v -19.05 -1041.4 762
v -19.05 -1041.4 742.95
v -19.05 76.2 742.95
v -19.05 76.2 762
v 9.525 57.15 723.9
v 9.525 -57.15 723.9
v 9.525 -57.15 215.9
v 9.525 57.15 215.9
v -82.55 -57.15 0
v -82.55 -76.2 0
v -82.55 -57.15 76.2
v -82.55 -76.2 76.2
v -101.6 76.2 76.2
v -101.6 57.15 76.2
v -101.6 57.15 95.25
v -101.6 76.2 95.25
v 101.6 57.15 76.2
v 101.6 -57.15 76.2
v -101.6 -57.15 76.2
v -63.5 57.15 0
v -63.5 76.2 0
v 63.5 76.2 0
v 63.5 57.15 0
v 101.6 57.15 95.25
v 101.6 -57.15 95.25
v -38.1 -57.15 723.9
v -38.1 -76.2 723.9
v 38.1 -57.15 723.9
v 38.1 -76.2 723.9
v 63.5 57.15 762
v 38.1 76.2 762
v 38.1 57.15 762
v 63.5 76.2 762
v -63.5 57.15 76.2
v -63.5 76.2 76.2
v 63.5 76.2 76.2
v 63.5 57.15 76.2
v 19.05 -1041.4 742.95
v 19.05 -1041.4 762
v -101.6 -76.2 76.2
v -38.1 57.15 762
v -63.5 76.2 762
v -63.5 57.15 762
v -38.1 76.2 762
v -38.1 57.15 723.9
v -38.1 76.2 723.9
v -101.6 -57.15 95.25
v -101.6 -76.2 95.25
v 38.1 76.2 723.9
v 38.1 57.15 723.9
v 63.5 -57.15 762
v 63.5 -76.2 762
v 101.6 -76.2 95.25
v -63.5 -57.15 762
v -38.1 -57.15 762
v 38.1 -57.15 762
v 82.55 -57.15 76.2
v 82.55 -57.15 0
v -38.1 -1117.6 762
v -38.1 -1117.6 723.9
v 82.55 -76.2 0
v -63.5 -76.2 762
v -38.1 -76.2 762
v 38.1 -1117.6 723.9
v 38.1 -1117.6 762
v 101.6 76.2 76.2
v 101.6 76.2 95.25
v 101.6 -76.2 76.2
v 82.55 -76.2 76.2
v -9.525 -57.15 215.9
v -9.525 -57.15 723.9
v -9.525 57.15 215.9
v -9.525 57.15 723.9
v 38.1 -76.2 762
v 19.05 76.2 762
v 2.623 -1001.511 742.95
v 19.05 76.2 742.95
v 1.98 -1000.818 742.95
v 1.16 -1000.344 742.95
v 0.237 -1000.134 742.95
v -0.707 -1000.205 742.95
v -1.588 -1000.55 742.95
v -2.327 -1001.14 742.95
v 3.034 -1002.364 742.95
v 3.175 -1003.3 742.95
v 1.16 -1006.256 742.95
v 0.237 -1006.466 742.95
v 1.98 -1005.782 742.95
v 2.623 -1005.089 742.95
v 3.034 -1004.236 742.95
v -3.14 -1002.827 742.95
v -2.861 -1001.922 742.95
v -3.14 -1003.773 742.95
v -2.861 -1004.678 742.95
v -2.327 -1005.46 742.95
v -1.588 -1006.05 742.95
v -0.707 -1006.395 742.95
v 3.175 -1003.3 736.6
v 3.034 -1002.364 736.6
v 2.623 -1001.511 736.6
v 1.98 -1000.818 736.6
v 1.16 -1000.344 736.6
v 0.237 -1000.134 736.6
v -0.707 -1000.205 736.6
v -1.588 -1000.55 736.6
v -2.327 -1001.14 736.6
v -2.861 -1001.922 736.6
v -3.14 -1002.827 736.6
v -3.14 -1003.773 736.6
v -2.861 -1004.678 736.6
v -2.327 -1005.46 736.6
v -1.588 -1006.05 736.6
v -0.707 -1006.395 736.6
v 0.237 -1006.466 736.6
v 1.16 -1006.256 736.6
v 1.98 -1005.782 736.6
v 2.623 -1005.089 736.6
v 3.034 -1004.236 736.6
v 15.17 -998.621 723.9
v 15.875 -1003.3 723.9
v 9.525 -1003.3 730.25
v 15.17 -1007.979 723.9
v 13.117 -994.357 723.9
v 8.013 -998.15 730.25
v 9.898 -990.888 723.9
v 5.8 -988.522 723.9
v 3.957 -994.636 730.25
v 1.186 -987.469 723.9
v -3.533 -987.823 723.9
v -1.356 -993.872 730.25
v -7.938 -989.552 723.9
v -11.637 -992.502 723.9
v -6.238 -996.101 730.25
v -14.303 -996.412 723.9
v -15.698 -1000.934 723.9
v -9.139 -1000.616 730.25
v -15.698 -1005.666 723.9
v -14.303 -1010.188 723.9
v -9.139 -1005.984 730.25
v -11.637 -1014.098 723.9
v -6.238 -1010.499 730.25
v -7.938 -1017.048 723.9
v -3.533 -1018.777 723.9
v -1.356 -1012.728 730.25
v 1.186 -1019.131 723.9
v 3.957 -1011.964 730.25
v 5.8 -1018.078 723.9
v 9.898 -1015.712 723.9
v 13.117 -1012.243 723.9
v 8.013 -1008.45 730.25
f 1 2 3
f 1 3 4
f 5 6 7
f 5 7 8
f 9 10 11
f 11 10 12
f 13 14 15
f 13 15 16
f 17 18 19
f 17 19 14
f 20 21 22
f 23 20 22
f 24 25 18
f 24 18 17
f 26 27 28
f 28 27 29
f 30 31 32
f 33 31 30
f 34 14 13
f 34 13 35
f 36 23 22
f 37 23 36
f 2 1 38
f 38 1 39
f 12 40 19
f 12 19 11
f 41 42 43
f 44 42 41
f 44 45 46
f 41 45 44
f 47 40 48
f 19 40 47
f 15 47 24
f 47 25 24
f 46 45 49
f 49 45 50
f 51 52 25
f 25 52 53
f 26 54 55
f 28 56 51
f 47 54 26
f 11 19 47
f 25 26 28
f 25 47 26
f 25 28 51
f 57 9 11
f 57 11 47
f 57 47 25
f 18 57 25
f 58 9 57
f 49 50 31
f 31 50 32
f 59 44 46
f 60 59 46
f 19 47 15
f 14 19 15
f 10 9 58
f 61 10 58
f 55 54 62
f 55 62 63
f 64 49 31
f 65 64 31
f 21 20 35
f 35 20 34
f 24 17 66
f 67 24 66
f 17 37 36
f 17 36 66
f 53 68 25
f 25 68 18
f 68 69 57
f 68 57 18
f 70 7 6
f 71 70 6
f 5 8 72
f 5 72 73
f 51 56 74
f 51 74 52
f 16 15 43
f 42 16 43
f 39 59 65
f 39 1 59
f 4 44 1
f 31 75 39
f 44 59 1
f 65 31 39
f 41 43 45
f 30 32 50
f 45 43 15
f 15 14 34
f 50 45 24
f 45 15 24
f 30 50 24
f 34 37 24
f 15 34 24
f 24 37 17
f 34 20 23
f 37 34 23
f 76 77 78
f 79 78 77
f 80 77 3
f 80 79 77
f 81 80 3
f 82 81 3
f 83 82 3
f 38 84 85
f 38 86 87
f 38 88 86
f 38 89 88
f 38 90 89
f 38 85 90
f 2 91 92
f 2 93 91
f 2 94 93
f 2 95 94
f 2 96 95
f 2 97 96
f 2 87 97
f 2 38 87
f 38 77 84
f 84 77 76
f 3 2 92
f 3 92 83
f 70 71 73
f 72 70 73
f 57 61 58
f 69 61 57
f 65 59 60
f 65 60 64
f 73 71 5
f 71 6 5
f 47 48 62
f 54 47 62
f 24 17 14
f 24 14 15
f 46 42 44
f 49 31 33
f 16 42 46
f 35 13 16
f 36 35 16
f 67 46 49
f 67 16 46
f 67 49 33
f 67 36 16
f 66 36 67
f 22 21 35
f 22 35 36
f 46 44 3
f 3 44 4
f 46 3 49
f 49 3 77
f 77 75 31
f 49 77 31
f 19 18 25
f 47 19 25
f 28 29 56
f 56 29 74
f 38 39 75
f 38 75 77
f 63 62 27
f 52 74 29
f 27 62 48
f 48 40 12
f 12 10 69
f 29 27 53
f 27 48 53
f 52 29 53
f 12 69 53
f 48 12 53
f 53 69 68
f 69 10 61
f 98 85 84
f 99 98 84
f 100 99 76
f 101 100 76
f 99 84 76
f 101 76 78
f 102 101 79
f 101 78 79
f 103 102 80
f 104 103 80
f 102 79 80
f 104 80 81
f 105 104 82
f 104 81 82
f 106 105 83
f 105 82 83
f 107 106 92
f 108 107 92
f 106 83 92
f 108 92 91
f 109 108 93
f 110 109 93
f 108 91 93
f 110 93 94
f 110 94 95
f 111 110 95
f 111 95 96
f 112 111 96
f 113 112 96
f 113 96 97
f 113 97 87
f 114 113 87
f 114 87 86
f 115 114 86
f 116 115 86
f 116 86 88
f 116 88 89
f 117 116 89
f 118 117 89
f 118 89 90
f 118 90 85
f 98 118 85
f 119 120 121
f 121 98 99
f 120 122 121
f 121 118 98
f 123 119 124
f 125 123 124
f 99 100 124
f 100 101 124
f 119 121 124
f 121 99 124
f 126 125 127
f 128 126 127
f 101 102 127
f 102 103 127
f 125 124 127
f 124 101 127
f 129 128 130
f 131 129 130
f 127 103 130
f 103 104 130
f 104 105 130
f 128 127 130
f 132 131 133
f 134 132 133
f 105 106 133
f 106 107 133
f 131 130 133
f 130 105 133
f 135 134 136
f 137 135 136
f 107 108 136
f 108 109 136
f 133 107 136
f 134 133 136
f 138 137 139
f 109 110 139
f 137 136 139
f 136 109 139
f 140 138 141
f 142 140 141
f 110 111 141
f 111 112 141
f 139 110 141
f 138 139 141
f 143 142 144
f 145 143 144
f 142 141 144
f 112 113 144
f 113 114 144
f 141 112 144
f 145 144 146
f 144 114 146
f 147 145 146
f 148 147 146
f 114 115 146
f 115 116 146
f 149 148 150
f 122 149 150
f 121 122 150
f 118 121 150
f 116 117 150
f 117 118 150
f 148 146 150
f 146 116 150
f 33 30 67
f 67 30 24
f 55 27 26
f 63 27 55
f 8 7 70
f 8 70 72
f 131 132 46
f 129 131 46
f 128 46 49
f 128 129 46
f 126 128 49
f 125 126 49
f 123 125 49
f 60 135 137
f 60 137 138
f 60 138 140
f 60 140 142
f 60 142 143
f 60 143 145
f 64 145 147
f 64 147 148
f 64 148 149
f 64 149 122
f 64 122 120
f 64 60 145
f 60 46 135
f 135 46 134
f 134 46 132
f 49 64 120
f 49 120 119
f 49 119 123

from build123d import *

# Parameters (mm, degrees)
F0_W           = 203.2
F0_H           = 19.05
F1_DEPTH       = 762
F2_W           = 19.05
F2_H           = 76.2
F2_W_2         = 76.2
F2_H_2         = 38.1
F3_DEPTH       = 25.4
F4_W           = 76.2
F4_H           = 38.1
F4_W_2         = 38.1
F4_H_2         = 76.2
F5_DEPTH       = 25.4
F7_DEPTH       = 1117.6
F7_DEPTH_BACK  = 76.2
F8_R           = 3.175
F9_DEPTH       = 25.4
F10_SIZE       = 12.7
F12_START      = 1041.4
F11_W          = 38.1
F11_H          = 19.05
F12_DEPTH      = 76.2
F13_W          = 114.3
F13_H          = 508
F14_DEPTH      = 9.525
F14_DEPTH_BACK = 9.525
F15_W          = 114.3
F15_H          = 19.05
F16_DEPTH      = 101.6
F16_DEPTH_BACK = 101.6


with BuildPart() as f1:
    # F0 (on Top) → F1 (new body)
    with BuildSketch(Plane.XY):
        with Locations((0, -66.675)):
            Rectangle(F0_W, F0_H)
    extrude(amount=F1_DEPTH)

    # F2 (on face) → F3 (cut)
    with BuildSketch(Plane.XZ.offset(76.2)):
        Polygon((101.6, 95.25), (101.6, 762), (63.5, 762), align=None)
        Polygon((-101.6, 95.25), (-63.5, 762), (-101.6, 762), align=None)
        with Locations((-92.075, 38.1)):
            Rectangle(F2_W, F2_H)
        with Locations((0, 742.95)):
            Rectangle(F2_W_2, F2_H_2)
        with Locations((92.075, 38.1)):
            Rectangle(F2_W, F2_H)
    extrude(amount=-F3_DEPTH, mode=Mode.SUBTRACT)


with BuildPart() as f1b:
    # F0 (on Top) → F1, piece 2 (new body)
    with BuildSketch(Plane.XY):
        with Locations((0, 66.675)):
            Rectangle(F0_W, F0_H)
    extrude(amount=F1_DEPTH)

    # F4 (on face) → F5 (cut)
    with BuildSketch(Plane.XZ.offset(-57.15)):
        with Locations((0, 742.95)):
            Rectangle(F4_W, F4_H)
        Polygon((101.6, 95.25), (101.6, 762), (63.5, 762), align=None)
        Polygon((-63.5, 762), (-101.6, 762), (-101.6, 95.25), align=None)
        with Locations((82.55, 38.1)):
            Rectangle(F4_W_2, F4_H_2)
        with Locations((-82.55, 38.1)):
            Rectangle(F4_W_2, F4_H_2)
    extrude(amount=-F5_DEPTH, mode=Mode.SUBTRACT)


with BuildPart() as f7:
    # F6 (on Front) → F7 (new body, two sides)
    with BuildSketch(Plane.XZ) as f7_sk:
        Polygon((-19.05, 762), (-38.1, 762), (-38.1, 723.9), (38.1, 723.9), (38.1, 762), (19.05, 762), (19.05, 742.95), (-19.05, 742.95), align=None)
    extrude(amount=F7_DEPTH)
    extrude(f7_sk.sketch, amount=-F7_DEPTH_BACK)

    # F8 (on face) → F9 (cut)
    with BuildSketch(Plane.XY.offset(742.95)):
        with Locations((0, -1003.3)):
            Circle(F8_R)
    extrude(amount=-F9_DEPTH, mode=Mode.SUBTRACT)

    # F10
    f10_edges = [f7.edges().sort_by_distance(p)[0] for p in [
        (-3.175, -1003.3, 723.9),
    ]]
    chamfer(f10_edges, length=F10_SIZE)

    # F11 (on Front) → F12 (join)
    with BuildSketch(Plane.XZ.offset(F12_START)):
        with Locations((0, 752.475)):
            Rectangle(F11_W, F11_H)
    extrude(amount=F12_DEPTH)


with BuildPart() as f14:
    # F13 (on Right) → F14 (new body, two sides)
    with BuildSketch(Plane.YZ) as f14_sk:
        with Locations((0, 469.9)):
            Rectangle(F13_W, F13_H)
    extrude(amount=F14_DEPTH)
    extrude(f14_sk.sketch, amount=-F14_DEPTH_BACK)


with BuildPart() as f16:
    # F15 (on Right) → F16 (new body, two sides)
    with BuildSketch(Plane.YZ) as f16_sk:
        with Locations((0, 85.725)):
            Rectangle(F15_W, F15_H)
    extrude(amount=F16_DEPTH)
    extrude(f16_sk.sketch, amount=-F16_DEPTH_BACK)


solid = Compound([f1.part, f1b.part, f7.part, f14.part, f16.part])
